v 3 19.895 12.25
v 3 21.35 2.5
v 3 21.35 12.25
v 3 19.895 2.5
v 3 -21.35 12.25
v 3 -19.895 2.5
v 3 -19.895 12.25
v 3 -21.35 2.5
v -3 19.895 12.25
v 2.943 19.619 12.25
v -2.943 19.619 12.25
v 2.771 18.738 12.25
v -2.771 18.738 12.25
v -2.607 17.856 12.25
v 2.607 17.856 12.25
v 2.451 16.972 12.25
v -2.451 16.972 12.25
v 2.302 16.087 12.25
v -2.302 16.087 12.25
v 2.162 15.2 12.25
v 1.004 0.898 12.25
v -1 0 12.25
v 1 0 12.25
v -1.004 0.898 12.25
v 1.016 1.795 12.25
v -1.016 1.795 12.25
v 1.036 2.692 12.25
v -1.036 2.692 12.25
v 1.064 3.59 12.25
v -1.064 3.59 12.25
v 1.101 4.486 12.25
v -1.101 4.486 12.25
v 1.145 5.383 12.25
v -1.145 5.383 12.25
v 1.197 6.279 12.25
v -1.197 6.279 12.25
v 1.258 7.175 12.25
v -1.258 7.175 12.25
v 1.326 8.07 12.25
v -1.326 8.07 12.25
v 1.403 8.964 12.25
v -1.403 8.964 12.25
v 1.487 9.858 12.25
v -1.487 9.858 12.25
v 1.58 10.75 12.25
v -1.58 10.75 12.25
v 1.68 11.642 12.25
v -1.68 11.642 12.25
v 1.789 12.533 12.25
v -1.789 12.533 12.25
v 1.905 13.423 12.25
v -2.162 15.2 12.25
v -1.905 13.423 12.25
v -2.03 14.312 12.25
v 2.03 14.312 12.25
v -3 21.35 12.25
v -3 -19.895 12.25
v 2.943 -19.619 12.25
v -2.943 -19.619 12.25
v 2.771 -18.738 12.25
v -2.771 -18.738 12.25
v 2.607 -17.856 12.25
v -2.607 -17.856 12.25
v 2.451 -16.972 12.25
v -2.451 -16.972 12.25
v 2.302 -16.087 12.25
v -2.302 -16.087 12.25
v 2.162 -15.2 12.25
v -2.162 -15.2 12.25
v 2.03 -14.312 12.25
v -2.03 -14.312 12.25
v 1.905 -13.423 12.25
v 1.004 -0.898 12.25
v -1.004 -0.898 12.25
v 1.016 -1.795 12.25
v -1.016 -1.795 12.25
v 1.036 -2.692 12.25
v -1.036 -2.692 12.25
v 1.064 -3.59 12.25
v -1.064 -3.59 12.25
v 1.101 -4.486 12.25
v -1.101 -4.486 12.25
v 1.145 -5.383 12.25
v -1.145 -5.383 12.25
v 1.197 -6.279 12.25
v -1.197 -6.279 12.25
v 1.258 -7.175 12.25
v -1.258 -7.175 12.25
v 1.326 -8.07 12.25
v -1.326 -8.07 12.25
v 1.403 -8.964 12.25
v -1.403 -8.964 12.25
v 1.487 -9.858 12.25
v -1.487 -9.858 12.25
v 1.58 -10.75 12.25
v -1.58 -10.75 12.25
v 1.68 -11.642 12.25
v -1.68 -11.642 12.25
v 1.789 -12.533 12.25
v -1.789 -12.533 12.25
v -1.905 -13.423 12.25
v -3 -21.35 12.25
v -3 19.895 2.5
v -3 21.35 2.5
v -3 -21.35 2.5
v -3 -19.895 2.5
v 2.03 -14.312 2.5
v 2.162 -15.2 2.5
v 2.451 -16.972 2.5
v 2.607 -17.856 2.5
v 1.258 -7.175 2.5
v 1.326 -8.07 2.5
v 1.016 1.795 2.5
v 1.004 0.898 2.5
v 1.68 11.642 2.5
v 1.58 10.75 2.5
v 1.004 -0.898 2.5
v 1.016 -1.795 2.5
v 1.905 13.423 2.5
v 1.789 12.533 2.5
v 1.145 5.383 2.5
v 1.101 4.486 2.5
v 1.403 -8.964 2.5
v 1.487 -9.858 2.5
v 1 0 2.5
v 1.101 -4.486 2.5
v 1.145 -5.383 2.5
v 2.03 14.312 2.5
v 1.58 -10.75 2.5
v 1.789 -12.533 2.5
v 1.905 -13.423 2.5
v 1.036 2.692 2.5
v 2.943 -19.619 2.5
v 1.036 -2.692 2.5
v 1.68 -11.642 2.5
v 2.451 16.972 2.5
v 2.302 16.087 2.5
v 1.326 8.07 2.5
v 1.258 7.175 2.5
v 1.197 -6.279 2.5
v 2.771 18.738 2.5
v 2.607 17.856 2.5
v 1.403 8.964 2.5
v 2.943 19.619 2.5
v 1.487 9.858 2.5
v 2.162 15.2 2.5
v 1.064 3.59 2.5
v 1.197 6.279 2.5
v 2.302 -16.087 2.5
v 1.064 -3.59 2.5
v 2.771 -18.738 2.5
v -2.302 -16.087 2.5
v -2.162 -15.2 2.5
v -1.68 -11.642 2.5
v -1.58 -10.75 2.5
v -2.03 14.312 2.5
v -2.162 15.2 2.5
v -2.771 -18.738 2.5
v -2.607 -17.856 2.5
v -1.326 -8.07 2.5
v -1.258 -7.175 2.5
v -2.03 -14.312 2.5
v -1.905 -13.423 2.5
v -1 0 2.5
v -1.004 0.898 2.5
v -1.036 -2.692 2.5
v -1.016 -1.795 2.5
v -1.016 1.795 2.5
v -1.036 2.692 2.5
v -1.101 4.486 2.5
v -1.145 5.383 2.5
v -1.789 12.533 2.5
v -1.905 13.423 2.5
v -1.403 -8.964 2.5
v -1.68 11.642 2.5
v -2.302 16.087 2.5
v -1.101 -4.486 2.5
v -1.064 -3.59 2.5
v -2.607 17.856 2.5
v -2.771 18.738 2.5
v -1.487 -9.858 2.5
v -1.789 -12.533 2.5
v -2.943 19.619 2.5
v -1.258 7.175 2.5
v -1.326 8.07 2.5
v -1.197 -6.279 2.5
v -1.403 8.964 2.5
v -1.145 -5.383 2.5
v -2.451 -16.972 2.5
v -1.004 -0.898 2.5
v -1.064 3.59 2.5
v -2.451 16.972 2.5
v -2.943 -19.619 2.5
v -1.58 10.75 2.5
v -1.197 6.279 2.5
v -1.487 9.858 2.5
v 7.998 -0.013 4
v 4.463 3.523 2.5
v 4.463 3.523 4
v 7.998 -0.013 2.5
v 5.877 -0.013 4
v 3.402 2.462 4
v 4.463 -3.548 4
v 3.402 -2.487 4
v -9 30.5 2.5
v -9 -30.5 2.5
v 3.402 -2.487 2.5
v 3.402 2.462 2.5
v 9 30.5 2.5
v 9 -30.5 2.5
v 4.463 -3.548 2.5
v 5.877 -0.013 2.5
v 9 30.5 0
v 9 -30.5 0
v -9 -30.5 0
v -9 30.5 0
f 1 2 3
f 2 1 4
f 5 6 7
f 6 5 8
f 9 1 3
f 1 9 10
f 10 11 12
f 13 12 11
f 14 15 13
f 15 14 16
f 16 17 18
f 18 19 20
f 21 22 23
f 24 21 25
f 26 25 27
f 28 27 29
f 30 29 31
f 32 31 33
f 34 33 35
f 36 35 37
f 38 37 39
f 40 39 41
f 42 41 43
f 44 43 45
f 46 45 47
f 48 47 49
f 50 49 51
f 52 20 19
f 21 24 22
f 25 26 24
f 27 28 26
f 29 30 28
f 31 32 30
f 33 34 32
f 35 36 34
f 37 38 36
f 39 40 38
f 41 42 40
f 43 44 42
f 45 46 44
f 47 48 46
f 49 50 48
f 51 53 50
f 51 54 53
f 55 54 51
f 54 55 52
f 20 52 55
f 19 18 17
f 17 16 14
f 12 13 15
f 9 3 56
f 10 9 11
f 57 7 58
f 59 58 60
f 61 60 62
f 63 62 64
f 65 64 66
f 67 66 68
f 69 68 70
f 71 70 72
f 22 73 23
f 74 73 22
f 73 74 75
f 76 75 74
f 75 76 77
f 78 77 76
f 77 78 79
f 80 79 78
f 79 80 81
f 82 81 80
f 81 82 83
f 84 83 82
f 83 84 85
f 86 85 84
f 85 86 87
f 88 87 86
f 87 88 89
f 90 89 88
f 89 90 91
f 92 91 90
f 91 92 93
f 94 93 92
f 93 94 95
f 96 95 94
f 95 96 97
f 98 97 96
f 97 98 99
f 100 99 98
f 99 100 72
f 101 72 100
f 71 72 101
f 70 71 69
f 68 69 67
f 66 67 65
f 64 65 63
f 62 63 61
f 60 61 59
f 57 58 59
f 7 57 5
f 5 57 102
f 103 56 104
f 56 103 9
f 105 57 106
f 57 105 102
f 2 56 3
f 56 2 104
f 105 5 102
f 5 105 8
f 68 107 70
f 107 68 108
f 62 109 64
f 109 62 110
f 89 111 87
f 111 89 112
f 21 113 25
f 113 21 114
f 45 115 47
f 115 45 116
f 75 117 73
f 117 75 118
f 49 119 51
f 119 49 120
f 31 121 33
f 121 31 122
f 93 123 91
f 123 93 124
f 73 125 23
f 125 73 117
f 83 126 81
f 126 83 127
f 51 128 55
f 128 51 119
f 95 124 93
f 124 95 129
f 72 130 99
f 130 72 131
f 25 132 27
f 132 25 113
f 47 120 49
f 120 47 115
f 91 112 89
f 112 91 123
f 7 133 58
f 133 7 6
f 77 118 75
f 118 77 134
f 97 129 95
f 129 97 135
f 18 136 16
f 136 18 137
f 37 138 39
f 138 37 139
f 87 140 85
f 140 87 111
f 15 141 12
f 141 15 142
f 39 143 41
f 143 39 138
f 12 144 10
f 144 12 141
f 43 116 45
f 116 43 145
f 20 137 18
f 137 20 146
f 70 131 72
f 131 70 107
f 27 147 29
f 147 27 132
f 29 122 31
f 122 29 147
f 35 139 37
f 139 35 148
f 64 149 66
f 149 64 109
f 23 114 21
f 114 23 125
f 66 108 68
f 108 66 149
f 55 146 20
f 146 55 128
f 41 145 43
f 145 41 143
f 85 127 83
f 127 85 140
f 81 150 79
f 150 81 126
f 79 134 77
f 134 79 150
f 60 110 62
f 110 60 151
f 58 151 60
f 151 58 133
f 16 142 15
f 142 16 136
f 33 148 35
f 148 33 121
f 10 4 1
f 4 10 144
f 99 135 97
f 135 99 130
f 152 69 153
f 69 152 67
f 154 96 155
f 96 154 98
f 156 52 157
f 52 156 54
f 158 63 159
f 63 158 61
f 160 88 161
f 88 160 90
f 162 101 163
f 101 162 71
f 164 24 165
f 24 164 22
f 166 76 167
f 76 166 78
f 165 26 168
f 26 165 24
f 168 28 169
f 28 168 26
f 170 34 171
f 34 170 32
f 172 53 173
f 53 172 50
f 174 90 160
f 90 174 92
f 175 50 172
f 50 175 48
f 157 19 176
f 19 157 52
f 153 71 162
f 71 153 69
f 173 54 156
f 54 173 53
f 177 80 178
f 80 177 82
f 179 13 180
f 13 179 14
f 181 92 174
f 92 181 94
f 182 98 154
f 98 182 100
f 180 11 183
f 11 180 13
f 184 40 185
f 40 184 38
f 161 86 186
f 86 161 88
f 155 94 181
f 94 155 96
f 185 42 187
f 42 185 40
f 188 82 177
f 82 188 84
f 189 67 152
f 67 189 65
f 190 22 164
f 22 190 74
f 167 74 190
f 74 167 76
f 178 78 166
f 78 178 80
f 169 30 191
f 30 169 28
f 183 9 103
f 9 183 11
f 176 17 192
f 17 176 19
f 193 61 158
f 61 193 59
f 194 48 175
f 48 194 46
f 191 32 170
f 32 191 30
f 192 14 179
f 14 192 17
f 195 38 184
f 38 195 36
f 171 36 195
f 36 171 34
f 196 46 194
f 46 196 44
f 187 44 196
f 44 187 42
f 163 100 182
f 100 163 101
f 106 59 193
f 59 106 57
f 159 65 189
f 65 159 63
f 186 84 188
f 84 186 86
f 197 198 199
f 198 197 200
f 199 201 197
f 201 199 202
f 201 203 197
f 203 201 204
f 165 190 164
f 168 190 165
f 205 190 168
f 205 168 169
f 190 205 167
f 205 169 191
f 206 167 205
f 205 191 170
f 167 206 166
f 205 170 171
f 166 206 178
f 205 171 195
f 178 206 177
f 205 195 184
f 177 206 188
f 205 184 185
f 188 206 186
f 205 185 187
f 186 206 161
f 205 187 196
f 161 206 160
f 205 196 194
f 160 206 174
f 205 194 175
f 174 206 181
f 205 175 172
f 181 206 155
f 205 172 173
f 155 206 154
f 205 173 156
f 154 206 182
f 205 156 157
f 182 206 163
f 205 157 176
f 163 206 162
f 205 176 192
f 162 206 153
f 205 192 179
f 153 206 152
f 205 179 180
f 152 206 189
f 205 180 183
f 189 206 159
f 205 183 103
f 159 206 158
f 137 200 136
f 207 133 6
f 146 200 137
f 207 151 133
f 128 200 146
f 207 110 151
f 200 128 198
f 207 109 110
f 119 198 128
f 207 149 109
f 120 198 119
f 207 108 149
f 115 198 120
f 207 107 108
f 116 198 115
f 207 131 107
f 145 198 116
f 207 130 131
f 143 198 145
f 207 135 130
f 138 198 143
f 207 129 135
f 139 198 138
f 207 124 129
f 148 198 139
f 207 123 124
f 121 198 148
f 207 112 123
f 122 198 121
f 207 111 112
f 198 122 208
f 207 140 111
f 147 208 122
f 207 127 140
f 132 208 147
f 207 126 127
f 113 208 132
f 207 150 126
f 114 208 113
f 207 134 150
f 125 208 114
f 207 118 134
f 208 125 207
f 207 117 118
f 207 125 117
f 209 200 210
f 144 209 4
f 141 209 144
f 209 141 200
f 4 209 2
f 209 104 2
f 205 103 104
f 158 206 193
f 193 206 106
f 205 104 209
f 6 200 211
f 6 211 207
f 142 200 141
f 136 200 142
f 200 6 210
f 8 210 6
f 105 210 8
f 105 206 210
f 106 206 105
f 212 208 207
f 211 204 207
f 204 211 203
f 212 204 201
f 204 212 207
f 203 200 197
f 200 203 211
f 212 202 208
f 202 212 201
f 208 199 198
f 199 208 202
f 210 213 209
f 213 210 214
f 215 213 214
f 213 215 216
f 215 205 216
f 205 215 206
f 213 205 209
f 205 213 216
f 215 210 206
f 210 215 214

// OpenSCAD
WIDTH 	= 61; // [0:200]
LENGTH 	= 18; // [0:200]

translate([0,0,1.25]) cube(size = [LENGTH,WIDTH,2.5], center = true);

translate([0,0,7.25]) {
	difference() {
		color("green") cube(size = [6,WIDTH-WIDTH*0.3,10], center = true);
		
		translate([101,0,0]) cylinder(h = 10.1, r = 100, $fn=700, center = true);
		translate([-101,0,0]) cylinder(h = 10.1, r = 100, $fn=700, center = true);
	}
}

translate([5.7,-1.25,3.25]) rotate([0,0,45]){
	color("red") cube([5, 1.5, 1.5], center = true);
	translate ([1.75,1.75,0]) color("red") cube([1.5, 5, 1.5], center = true);
}
